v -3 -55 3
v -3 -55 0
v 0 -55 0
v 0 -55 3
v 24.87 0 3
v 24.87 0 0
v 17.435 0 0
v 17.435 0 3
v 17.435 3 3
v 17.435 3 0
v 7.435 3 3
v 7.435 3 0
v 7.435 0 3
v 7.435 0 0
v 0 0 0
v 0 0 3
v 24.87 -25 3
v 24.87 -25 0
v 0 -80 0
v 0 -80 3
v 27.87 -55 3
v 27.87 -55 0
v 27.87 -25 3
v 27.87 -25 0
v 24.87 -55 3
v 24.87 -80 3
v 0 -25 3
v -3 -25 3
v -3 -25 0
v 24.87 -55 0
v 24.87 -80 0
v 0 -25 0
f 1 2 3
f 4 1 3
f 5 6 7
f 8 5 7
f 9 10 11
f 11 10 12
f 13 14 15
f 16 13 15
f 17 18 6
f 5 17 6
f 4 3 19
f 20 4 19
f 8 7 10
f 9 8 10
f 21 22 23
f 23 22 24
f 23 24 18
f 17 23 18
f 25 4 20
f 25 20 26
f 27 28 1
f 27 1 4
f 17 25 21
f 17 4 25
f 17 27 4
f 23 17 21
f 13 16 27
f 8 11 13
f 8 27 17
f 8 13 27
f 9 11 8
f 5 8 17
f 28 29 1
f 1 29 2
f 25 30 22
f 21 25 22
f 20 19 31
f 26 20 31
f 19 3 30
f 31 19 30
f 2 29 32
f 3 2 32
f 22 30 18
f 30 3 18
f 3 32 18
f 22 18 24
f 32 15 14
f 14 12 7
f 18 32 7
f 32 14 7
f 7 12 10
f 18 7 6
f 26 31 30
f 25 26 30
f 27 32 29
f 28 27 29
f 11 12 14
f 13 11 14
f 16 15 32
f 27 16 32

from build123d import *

# Parameters (mm, degrees)
EXTRUDE_1_DEPTH = 3


with BuildPart() as part:
    # 草图1 → 凸台-拉伸1 (new body)
    with BuildSketch(Plane.XY):
        Polygon((0, -25), (0, -40), (12.435, -40), (12.435, 0), (7.435, 0), (0, 0), align=None)
        Polygon((12.435, 0), (12.435, -40), (24.87, -40), (24.87, -25), (24.87, 0), (17.435, 0), align=None)
        Polygon((24.87, -40), (12.435, -40), (12.435, -80), (24.87, -80), (24.87, -55), align=None)
        Polygon((12.435, -40), (0, -40), (0, -55), (0, -80), (12.435, -80), align=None)
        Polygon((0, -55), (0, -40), (0, -25), (-3, -25), (-3, -55), align=None)
        Polygon((7.435, 0), (12.435, 0), (17.435, 0), (17.435, 3), (7.435, 3), align=None)
        Polygon((24.87, -25), (24.87, -40), (24.87, -55), (27.87, -55), (27.87, -25), align=None)
    extrude(amount=EXTRUDE_1_DEPTH)


solid = part.part
